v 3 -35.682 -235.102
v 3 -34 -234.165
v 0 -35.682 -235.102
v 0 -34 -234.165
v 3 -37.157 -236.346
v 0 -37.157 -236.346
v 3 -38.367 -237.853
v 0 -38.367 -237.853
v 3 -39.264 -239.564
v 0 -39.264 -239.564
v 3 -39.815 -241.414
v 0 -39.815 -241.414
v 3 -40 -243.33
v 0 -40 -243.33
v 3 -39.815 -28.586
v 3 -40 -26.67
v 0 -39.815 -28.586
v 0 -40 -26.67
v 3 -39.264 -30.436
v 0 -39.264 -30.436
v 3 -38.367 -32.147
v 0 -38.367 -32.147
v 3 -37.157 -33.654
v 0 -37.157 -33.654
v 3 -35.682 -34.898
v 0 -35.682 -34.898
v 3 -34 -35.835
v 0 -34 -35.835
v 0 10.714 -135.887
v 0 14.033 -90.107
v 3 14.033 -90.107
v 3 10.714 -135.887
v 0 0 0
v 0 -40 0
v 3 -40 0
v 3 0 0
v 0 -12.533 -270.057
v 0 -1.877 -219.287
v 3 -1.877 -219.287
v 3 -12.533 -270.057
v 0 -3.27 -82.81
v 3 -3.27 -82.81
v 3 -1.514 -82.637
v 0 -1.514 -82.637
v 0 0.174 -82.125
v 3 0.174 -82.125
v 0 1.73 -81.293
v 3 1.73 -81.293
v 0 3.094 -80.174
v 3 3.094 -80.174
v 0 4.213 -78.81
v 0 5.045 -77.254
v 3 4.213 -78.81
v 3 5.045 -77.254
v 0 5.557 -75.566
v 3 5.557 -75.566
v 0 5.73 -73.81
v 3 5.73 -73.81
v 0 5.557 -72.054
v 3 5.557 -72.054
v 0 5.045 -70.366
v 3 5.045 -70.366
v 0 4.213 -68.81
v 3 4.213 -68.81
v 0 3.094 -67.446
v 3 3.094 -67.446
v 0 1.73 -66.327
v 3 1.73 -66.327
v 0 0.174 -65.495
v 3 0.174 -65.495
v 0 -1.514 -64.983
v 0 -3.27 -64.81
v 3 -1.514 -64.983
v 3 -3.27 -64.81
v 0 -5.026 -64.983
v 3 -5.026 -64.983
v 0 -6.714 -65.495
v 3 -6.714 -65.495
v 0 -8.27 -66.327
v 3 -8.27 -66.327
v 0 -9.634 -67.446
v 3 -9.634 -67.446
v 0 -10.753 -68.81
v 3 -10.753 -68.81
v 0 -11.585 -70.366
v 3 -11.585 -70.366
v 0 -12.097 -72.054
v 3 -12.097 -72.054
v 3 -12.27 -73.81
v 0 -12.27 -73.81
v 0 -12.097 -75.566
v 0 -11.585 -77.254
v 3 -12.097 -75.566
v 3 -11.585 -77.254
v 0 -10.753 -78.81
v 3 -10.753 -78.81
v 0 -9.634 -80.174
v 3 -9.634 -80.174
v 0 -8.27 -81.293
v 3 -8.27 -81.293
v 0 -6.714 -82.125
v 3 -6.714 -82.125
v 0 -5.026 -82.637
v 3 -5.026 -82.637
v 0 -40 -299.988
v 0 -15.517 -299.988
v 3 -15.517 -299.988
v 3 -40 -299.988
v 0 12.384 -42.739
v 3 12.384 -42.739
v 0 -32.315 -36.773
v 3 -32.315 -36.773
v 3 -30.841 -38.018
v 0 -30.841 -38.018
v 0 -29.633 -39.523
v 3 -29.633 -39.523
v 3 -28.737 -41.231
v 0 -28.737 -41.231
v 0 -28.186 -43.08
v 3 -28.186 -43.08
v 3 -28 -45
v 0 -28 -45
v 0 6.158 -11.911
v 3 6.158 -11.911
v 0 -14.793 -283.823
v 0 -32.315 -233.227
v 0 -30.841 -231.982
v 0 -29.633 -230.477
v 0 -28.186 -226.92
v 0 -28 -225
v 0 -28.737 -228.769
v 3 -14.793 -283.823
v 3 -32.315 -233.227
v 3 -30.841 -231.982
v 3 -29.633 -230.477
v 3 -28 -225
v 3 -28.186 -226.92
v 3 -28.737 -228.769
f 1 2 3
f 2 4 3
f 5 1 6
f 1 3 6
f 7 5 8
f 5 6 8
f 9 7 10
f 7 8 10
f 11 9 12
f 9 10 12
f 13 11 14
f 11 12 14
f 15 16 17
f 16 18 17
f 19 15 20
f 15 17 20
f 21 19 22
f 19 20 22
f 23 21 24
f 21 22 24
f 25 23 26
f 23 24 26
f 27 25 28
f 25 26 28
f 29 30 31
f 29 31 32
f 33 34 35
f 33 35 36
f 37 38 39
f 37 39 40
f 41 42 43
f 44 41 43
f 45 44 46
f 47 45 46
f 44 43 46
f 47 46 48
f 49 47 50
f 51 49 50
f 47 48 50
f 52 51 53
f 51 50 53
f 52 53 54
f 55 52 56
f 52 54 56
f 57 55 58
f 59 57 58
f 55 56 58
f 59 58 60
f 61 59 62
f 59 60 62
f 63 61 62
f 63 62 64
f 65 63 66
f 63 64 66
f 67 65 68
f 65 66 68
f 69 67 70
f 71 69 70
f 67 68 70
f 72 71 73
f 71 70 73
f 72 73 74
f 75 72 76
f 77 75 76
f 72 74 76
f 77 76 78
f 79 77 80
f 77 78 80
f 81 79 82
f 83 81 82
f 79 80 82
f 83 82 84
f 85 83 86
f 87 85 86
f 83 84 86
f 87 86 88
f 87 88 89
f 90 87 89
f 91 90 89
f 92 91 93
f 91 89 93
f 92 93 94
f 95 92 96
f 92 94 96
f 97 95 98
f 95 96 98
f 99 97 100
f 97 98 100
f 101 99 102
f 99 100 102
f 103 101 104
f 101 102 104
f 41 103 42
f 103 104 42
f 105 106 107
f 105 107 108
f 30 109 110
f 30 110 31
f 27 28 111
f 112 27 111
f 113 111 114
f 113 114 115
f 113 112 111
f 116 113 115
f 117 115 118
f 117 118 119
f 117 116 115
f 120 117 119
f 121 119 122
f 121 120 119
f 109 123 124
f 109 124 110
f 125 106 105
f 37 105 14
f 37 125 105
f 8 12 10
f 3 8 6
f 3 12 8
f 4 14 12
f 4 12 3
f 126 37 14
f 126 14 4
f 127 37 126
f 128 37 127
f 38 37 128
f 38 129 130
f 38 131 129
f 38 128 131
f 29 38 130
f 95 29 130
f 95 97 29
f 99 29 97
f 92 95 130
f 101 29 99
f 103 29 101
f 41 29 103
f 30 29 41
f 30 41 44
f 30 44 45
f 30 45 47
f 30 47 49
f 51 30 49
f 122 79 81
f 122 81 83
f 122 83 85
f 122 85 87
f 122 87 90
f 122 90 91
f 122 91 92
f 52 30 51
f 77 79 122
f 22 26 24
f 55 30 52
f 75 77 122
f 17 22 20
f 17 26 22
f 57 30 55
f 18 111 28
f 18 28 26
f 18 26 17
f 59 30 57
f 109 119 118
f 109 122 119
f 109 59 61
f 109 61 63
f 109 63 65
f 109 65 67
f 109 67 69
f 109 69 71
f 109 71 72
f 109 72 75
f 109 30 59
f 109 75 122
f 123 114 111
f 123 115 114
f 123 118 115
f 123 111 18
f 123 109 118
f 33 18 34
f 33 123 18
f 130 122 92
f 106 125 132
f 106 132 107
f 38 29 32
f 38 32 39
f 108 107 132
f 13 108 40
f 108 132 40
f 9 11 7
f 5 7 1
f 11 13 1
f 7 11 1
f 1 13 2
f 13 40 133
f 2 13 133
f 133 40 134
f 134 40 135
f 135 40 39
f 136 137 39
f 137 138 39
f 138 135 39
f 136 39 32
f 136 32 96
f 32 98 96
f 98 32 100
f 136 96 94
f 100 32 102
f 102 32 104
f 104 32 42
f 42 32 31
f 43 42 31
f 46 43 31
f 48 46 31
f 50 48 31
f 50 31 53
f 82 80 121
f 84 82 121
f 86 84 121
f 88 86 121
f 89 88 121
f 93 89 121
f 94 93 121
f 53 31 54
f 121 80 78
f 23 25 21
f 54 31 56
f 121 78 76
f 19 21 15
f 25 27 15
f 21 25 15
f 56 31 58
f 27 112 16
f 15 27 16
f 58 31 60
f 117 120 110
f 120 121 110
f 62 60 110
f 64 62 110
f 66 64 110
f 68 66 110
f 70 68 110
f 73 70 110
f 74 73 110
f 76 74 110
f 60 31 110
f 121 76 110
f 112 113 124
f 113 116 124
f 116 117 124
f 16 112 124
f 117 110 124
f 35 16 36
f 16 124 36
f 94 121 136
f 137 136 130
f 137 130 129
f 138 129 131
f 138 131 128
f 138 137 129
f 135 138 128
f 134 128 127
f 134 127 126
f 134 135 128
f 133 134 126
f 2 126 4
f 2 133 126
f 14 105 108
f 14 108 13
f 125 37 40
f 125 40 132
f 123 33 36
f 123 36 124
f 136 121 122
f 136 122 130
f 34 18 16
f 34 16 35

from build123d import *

# Parameters (mm, degrees)
BOSS_EXTRUDE1_DEPTH = 3
CUT_EXTRUDE1_DEPTH  = 3
FILLET1_R           = 10
SKETCH3_R           = 9
CUT_EXTRUDE2_DEPTH  = 3


with BuildPart() as part:
    # Sketch1 → Boss-Extrude1 (new body)
    with BuildSketch(Plane(origin=(0, 0, 0), x_dir=(0, 0, -1), z_dir=(1, 0, 0))):
        Polygon((0, 0), (11.910798094, 6.158004928), (42.739414765, 12.383521095), (90.106781804, 14.033136775), (135.887385092, 10.713704644), (219.287488067, -1.876713431), (270.057015241, -12.532639482), (283.823146281, -14.792882614), (299.988096251, -15.517362165), (299.988096251, -40), (0, -40), align=None)
    extrude(amount=BOSS_EXTRUDE1_DEPTH)

    # Sketch2 → Cut-Extrude1 (cut)
    with BuildSketch(Plane(origin=(3, 0, 0), x_dir=(0, 0, -1), z_dir=(1, 0, 0))):
        with BuildLine():
            Line((35, -40), (35, -38))
            ThreePointArc((35, -38), (37.928932188, -30.928932188), (45, -28))
            Line((45, -28), (225, -28))
            ThreePointArc((225, -28), (232.071067812, -30.928932188), (235, -38))
            Line((235, -38), (235, -40))
            Line((235, -40), (35, -40))
        make_face()
    extrude(amount=-CUT_EXTRUDE1_DEPTH, mode=Mode.SUBTRACT)

    # Fillet1
    fillet1_edges = [part.edges().sort_by_distance(p)[0] for p in [
        (1.5, -40, -235),
        (1.5, -40, -35),
    ]]
    fillet(fillet1_edges, radius=FILLET1_R)

    # Sketch3 → Cut-Extrude2 (cut)
    with BuildSketch(Plane(origin=(3, 0, 0), x_dir=(0, 0, -1), z_dir=(1, 0, 0))):
        with Locations((73.81, -3.27)):
            Circle(SKETCH3_R)
    extrude(amount=-CUT_EXTRUDE2_DEPTH, mode=Mode.SUBTRACT)


solid = part.part
